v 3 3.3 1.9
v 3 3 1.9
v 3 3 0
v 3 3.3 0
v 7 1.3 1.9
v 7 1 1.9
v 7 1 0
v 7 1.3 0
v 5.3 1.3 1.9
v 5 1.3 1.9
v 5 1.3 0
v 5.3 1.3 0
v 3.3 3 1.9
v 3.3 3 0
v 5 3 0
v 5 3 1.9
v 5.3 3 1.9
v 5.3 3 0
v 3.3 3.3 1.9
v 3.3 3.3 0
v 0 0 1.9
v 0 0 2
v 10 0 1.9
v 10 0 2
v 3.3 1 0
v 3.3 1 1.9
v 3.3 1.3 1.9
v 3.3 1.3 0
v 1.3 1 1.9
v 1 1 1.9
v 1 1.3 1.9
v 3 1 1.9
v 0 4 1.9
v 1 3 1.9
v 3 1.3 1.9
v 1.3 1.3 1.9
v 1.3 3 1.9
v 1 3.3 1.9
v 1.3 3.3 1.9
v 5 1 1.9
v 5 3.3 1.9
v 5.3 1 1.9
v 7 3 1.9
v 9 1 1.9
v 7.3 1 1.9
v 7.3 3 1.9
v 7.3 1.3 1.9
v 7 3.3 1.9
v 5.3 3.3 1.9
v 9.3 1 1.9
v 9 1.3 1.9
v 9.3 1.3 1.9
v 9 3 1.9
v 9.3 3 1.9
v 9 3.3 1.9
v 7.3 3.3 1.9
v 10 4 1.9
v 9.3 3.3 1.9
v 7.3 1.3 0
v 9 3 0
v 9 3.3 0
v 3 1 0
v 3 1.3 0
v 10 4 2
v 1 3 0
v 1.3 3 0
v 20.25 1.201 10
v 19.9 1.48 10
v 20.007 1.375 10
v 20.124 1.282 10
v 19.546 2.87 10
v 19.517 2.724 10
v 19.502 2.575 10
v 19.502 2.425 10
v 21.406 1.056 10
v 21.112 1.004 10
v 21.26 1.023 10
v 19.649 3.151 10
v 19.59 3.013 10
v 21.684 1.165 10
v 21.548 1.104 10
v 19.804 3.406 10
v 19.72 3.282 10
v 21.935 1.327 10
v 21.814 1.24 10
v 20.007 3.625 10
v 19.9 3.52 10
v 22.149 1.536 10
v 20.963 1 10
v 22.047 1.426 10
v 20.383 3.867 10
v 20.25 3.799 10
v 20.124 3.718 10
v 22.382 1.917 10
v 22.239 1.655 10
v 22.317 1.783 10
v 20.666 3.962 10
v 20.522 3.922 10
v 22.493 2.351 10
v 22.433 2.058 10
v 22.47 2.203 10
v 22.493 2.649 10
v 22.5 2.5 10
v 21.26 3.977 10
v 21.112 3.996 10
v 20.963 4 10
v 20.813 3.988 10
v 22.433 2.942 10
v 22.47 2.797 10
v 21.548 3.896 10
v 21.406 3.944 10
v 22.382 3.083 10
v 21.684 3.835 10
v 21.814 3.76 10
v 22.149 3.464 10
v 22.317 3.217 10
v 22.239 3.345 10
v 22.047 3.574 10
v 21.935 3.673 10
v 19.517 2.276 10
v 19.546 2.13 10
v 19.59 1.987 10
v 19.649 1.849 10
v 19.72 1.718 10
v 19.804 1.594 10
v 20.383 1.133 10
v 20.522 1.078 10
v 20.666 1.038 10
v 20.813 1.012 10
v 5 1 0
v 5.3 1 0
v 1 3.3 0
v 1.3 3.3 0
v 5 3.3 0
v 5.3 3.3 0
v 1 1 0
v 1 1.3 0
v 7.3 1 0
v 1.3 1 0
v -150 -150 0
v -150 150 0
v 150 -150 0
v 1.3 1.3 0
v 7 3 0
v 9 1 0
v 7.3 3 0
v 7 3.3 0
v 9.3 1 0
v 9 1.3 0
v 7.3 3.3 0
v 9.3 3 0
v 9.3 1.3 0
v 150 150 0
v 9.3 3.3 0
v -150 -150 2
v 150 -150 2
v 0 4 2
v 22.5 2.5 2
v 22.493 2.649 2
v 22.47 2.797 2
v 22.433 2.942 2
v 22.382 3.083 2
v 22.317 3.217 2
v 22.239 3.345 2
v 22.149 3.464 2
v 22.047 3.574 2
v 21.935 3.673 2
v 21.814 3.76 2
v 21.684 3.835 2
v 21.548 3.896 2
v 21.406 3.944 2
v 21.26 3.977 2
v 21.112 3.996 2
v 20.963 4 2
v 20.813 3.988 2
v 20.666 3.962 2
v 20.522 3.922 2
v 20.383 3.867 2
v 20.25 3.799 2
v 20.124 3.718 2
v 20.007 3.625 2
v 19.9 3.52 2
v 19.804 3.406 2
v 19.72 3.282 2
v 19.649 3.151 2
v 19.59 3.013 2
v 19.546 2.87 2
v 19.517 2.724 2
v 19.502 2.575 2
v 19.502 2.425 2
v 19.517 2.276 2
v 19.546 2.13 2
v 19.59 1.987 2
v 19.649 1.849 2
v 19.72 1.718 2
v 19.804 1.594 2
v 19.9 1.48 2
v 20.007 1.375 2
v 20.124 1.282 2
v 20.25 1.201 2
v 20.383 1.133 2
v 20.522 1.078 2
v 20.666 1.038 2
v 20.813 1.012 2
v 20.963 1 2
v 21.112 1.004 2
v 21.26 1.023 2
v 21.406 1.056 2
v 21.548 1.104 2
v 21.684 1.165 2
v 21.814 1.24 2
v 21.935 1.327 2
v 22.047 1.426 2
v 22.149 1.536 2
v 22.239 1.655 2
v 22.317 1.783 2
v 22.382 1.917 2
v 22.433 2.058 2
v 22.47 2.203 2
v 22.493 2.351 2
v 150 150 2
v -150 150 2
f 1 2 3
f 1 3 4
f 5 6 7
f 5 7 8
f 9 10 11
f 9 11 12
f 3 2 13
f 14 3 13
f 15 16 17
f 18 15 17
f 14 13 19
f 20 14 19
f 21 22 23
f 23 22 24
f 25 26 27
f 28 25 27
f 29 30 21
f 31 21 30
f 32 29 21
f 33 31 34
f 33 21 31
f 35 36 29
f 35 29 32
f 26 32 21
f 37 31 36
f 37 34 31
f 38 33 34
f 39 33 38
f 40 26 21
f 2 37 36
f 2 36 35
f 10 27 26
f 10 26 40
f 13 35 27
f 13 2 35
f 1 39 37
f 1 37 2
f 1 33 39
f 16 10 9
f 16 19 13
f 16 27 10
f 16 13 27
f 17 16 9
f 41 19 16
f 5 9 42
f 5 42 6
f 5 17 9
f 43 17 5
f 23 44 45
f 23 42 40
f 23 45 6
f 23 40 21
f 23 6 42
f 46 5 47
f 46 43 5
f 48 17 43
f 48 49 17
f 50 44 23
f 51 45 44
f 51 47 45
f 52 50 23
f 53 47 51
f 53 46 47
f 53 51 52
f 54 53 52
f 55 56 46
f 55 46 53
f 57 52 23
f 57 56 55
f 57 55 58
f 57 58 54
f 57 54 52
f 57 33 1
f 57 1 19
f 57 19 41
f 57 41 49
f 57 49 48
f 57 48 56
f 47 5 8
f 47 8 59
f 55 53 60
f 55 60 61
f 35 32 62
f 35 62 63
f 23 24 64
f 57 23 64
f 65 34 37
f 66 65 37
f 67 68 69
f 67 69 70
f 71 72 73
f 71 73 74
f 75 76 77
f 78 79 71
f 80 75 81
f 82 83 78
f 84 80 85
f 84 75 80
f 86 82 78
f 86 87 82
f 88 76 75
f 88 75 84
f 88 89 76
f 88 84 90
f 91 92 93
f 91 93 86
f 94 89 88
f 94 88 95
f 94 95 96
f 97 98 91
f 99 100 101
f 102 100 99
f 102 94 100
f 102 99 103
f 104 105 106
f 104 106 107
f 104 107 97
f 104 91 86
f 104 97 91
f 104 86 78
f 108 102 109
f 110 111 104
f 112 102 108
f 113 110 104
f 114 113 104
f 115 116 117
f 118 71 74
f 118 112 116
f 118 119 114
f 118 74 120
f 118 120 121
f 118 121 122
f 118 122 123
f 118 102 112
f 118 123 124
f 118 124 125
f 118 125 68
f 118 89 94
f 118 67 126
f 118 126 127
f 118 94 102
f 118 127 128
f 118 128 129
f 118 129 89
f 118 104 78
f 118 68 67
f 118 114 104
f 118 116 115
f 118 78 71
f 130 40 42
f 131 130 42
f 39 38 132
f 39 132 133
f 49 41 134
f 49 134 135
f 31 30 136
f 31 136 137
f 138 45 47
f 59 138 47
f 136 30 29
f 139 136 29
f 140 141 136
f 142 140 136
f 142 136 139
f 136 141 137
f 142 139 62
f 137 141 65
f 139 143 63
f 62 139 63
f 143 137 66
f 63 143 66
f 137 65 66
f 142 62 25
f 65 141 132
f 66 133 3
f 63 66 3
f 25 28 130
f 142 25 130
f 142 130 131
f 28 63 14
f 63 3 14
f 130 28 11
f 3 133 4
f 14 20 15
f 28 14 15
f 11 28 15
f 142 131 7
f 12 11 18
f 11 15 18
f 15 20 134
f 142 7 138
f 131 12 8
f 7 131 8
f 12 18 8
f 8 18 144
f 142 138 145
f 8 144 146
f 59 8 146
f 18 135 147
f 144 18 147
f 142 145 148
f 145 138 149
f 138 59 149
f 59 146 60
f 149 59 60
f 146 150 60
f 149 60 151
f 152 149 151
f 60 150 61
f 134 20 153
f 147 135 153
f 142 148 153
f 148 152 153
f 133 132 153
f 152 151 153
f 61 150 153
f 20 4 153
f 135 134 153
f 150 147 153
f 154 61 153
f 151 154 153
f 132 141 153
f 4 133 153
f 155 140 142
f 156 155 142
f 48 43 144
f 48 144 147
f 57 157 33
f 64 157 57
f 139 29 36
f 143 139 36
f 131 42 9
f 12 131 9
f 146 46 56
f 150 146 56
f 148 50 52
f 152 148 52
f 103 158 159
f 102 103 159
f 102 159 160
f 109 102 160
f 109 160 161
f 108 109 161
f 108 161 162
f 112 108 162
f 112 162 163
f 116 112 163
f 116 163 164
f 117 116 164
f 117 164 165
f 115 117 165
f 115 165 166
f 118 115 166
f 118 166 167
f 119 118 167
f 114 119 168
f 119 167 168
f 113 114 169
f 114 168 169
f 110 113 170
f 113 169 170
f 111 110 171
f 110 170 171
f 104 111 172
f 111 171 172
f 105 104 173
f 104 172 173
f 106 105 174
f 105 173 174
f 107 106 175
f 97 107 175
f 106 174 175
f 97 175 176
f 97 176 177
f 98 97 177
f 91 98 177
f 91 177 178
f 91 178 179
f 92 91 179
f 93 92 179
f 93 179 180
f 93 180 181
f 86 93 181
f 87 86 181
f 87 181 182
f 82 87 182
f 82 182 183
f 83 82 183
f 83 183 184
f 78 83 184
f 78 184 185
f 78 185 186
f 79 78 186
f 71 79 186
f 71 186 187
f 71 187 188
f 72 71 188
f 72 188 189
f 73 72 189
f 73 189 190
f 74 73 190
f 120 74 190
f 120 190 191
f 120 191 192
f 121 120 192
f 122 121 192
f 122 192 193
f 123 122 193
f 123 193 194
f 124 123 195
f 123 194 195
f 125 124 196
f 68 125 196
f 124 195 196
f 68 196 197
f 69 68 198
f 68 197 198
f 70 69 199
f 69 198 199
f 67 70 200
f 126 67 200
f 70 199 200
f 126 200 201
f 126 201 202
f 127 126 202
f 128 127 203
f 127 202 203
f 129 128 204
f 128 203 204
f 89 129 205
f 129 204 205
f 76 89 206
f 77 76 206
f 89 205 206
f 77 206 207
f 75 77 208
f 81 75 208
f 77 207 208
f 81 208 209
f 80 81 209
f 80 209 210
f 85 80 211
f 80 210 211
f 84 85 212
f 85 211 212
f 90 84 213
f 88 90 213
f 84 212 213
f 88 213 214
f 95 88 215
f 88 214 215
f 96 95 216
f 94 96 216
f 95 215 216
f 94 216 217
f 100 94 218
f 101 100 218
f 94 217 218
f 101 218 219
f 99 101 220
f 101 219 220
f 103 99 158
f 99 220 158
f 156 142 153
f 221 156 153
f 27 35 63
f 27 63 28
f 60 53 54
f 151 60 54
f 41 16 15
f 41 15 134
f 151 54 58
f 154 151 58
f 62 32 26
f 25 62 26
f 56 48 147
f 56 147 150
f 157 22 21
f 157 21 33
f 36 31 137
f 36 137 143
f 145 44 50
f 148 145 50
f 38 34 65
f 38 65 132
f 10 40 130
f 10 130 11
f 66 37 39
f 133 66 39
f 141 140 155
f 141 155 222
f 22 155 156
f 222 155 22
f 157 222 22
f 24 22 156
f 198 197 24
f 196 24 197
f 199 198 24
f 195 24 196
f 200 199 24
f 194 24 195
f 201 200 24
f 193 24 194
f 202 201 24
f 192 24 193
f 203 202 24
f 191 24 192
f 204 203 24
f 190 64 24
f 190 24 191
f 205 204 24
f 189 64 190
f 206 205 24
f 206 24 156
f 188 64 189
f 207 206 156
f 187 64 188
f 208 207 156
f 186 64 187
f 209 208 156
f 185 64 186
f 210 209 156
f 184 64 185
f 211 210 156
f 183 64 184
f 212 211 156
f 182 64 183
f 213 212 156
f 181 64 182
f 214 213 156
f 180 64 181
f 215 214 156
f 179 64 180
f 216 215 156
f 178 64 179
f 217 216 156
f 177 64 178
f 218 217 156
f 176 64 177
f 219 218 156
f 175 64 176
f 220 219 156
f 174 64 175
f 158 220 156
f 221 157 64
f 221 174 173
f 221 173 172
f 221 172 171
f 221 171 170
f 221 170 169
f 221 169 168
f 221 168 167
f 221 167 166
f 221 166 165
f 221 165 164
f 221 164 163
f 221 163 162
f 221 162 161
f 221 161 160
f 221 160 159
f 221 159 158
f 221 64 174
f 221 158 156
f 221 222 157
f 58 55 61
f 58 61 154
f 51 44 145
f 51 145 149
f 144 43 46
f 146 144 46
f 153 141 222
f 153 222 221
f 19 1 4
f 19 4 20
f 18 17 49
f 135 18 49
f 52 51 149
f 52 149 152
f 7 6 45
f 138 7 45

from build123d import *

# Parameters (mm, degrees)
F0_W     = 300
F0_H     = 300
F1_DEPTH = 2
F2_W     = 10
F2_H     = 4
F3_DEPTH = 0.1
F4_W     = 0.3
F4_H     = 0.3
F5_DEPTH = 3
F6_R     = 1.5
F7_DEPTH = 10


with BuildPart() as f1:
    # F0 (on Top) → F1 (new body)
    with BuildSketch(Plane.XY):
        Rectangle(F0_W, F0_H)
    extrude(amount=F1_DEPTH)

    # F2 (on face) → F3 (cut)
    with BuildSketch(Plane.XY.offset(2)):
        with Locations((5, 2)):
            Rectangle(F2_W, F2_H)
    extrude(amount=-F3_DEPTH, mode=Mode.SUBTRACT)

    # F4 (on face) → F5 (cut)
    with BuildSketch(Plane.XY.offset(2)):
        with Locations((1.15, 3.15)):
            Rectangle(F4_W, F4_H)
        with Locations((1.15, 1.15)):
            Rectangle(F4_W, F4_H)
        with Locations((3.15, 3.15)):
            Rectangle(F4_W, F4_H)
        with Locations((3.15, 1.15)):
            Rectangle(F4_W, F4_H)
        with Locations((5.15, 3.15)):
            Rectangle(F4_W, F4_H)
        with Locations((5.15, 1.15)):
            Rectangle(F4_W, F4_H)
        with Locations((7.15, 3.15)):
            Rectangle(F4_W, F4_H)
        with Locations((7.15, 1.15)):
            Rectangle(F4_W, F4_H)
        with Locations((9.15, 3.15)):
            Rectangle(F4_W, F4_H)
        with Locations((9.15, 1.15)):
            Rectangle(F4_W, F4_H)
    extrude(amount=-F5_DEPTH, mode=Mode.SUBTRACT)

    # F6 (on Top) → F7 (join)
    with BuildSketch(Plane.XY):
        with Locations((21, 2.5)):
            Circle(F6_R)
    extrude(amount=F7_DEPTH)


solid = f1.part
